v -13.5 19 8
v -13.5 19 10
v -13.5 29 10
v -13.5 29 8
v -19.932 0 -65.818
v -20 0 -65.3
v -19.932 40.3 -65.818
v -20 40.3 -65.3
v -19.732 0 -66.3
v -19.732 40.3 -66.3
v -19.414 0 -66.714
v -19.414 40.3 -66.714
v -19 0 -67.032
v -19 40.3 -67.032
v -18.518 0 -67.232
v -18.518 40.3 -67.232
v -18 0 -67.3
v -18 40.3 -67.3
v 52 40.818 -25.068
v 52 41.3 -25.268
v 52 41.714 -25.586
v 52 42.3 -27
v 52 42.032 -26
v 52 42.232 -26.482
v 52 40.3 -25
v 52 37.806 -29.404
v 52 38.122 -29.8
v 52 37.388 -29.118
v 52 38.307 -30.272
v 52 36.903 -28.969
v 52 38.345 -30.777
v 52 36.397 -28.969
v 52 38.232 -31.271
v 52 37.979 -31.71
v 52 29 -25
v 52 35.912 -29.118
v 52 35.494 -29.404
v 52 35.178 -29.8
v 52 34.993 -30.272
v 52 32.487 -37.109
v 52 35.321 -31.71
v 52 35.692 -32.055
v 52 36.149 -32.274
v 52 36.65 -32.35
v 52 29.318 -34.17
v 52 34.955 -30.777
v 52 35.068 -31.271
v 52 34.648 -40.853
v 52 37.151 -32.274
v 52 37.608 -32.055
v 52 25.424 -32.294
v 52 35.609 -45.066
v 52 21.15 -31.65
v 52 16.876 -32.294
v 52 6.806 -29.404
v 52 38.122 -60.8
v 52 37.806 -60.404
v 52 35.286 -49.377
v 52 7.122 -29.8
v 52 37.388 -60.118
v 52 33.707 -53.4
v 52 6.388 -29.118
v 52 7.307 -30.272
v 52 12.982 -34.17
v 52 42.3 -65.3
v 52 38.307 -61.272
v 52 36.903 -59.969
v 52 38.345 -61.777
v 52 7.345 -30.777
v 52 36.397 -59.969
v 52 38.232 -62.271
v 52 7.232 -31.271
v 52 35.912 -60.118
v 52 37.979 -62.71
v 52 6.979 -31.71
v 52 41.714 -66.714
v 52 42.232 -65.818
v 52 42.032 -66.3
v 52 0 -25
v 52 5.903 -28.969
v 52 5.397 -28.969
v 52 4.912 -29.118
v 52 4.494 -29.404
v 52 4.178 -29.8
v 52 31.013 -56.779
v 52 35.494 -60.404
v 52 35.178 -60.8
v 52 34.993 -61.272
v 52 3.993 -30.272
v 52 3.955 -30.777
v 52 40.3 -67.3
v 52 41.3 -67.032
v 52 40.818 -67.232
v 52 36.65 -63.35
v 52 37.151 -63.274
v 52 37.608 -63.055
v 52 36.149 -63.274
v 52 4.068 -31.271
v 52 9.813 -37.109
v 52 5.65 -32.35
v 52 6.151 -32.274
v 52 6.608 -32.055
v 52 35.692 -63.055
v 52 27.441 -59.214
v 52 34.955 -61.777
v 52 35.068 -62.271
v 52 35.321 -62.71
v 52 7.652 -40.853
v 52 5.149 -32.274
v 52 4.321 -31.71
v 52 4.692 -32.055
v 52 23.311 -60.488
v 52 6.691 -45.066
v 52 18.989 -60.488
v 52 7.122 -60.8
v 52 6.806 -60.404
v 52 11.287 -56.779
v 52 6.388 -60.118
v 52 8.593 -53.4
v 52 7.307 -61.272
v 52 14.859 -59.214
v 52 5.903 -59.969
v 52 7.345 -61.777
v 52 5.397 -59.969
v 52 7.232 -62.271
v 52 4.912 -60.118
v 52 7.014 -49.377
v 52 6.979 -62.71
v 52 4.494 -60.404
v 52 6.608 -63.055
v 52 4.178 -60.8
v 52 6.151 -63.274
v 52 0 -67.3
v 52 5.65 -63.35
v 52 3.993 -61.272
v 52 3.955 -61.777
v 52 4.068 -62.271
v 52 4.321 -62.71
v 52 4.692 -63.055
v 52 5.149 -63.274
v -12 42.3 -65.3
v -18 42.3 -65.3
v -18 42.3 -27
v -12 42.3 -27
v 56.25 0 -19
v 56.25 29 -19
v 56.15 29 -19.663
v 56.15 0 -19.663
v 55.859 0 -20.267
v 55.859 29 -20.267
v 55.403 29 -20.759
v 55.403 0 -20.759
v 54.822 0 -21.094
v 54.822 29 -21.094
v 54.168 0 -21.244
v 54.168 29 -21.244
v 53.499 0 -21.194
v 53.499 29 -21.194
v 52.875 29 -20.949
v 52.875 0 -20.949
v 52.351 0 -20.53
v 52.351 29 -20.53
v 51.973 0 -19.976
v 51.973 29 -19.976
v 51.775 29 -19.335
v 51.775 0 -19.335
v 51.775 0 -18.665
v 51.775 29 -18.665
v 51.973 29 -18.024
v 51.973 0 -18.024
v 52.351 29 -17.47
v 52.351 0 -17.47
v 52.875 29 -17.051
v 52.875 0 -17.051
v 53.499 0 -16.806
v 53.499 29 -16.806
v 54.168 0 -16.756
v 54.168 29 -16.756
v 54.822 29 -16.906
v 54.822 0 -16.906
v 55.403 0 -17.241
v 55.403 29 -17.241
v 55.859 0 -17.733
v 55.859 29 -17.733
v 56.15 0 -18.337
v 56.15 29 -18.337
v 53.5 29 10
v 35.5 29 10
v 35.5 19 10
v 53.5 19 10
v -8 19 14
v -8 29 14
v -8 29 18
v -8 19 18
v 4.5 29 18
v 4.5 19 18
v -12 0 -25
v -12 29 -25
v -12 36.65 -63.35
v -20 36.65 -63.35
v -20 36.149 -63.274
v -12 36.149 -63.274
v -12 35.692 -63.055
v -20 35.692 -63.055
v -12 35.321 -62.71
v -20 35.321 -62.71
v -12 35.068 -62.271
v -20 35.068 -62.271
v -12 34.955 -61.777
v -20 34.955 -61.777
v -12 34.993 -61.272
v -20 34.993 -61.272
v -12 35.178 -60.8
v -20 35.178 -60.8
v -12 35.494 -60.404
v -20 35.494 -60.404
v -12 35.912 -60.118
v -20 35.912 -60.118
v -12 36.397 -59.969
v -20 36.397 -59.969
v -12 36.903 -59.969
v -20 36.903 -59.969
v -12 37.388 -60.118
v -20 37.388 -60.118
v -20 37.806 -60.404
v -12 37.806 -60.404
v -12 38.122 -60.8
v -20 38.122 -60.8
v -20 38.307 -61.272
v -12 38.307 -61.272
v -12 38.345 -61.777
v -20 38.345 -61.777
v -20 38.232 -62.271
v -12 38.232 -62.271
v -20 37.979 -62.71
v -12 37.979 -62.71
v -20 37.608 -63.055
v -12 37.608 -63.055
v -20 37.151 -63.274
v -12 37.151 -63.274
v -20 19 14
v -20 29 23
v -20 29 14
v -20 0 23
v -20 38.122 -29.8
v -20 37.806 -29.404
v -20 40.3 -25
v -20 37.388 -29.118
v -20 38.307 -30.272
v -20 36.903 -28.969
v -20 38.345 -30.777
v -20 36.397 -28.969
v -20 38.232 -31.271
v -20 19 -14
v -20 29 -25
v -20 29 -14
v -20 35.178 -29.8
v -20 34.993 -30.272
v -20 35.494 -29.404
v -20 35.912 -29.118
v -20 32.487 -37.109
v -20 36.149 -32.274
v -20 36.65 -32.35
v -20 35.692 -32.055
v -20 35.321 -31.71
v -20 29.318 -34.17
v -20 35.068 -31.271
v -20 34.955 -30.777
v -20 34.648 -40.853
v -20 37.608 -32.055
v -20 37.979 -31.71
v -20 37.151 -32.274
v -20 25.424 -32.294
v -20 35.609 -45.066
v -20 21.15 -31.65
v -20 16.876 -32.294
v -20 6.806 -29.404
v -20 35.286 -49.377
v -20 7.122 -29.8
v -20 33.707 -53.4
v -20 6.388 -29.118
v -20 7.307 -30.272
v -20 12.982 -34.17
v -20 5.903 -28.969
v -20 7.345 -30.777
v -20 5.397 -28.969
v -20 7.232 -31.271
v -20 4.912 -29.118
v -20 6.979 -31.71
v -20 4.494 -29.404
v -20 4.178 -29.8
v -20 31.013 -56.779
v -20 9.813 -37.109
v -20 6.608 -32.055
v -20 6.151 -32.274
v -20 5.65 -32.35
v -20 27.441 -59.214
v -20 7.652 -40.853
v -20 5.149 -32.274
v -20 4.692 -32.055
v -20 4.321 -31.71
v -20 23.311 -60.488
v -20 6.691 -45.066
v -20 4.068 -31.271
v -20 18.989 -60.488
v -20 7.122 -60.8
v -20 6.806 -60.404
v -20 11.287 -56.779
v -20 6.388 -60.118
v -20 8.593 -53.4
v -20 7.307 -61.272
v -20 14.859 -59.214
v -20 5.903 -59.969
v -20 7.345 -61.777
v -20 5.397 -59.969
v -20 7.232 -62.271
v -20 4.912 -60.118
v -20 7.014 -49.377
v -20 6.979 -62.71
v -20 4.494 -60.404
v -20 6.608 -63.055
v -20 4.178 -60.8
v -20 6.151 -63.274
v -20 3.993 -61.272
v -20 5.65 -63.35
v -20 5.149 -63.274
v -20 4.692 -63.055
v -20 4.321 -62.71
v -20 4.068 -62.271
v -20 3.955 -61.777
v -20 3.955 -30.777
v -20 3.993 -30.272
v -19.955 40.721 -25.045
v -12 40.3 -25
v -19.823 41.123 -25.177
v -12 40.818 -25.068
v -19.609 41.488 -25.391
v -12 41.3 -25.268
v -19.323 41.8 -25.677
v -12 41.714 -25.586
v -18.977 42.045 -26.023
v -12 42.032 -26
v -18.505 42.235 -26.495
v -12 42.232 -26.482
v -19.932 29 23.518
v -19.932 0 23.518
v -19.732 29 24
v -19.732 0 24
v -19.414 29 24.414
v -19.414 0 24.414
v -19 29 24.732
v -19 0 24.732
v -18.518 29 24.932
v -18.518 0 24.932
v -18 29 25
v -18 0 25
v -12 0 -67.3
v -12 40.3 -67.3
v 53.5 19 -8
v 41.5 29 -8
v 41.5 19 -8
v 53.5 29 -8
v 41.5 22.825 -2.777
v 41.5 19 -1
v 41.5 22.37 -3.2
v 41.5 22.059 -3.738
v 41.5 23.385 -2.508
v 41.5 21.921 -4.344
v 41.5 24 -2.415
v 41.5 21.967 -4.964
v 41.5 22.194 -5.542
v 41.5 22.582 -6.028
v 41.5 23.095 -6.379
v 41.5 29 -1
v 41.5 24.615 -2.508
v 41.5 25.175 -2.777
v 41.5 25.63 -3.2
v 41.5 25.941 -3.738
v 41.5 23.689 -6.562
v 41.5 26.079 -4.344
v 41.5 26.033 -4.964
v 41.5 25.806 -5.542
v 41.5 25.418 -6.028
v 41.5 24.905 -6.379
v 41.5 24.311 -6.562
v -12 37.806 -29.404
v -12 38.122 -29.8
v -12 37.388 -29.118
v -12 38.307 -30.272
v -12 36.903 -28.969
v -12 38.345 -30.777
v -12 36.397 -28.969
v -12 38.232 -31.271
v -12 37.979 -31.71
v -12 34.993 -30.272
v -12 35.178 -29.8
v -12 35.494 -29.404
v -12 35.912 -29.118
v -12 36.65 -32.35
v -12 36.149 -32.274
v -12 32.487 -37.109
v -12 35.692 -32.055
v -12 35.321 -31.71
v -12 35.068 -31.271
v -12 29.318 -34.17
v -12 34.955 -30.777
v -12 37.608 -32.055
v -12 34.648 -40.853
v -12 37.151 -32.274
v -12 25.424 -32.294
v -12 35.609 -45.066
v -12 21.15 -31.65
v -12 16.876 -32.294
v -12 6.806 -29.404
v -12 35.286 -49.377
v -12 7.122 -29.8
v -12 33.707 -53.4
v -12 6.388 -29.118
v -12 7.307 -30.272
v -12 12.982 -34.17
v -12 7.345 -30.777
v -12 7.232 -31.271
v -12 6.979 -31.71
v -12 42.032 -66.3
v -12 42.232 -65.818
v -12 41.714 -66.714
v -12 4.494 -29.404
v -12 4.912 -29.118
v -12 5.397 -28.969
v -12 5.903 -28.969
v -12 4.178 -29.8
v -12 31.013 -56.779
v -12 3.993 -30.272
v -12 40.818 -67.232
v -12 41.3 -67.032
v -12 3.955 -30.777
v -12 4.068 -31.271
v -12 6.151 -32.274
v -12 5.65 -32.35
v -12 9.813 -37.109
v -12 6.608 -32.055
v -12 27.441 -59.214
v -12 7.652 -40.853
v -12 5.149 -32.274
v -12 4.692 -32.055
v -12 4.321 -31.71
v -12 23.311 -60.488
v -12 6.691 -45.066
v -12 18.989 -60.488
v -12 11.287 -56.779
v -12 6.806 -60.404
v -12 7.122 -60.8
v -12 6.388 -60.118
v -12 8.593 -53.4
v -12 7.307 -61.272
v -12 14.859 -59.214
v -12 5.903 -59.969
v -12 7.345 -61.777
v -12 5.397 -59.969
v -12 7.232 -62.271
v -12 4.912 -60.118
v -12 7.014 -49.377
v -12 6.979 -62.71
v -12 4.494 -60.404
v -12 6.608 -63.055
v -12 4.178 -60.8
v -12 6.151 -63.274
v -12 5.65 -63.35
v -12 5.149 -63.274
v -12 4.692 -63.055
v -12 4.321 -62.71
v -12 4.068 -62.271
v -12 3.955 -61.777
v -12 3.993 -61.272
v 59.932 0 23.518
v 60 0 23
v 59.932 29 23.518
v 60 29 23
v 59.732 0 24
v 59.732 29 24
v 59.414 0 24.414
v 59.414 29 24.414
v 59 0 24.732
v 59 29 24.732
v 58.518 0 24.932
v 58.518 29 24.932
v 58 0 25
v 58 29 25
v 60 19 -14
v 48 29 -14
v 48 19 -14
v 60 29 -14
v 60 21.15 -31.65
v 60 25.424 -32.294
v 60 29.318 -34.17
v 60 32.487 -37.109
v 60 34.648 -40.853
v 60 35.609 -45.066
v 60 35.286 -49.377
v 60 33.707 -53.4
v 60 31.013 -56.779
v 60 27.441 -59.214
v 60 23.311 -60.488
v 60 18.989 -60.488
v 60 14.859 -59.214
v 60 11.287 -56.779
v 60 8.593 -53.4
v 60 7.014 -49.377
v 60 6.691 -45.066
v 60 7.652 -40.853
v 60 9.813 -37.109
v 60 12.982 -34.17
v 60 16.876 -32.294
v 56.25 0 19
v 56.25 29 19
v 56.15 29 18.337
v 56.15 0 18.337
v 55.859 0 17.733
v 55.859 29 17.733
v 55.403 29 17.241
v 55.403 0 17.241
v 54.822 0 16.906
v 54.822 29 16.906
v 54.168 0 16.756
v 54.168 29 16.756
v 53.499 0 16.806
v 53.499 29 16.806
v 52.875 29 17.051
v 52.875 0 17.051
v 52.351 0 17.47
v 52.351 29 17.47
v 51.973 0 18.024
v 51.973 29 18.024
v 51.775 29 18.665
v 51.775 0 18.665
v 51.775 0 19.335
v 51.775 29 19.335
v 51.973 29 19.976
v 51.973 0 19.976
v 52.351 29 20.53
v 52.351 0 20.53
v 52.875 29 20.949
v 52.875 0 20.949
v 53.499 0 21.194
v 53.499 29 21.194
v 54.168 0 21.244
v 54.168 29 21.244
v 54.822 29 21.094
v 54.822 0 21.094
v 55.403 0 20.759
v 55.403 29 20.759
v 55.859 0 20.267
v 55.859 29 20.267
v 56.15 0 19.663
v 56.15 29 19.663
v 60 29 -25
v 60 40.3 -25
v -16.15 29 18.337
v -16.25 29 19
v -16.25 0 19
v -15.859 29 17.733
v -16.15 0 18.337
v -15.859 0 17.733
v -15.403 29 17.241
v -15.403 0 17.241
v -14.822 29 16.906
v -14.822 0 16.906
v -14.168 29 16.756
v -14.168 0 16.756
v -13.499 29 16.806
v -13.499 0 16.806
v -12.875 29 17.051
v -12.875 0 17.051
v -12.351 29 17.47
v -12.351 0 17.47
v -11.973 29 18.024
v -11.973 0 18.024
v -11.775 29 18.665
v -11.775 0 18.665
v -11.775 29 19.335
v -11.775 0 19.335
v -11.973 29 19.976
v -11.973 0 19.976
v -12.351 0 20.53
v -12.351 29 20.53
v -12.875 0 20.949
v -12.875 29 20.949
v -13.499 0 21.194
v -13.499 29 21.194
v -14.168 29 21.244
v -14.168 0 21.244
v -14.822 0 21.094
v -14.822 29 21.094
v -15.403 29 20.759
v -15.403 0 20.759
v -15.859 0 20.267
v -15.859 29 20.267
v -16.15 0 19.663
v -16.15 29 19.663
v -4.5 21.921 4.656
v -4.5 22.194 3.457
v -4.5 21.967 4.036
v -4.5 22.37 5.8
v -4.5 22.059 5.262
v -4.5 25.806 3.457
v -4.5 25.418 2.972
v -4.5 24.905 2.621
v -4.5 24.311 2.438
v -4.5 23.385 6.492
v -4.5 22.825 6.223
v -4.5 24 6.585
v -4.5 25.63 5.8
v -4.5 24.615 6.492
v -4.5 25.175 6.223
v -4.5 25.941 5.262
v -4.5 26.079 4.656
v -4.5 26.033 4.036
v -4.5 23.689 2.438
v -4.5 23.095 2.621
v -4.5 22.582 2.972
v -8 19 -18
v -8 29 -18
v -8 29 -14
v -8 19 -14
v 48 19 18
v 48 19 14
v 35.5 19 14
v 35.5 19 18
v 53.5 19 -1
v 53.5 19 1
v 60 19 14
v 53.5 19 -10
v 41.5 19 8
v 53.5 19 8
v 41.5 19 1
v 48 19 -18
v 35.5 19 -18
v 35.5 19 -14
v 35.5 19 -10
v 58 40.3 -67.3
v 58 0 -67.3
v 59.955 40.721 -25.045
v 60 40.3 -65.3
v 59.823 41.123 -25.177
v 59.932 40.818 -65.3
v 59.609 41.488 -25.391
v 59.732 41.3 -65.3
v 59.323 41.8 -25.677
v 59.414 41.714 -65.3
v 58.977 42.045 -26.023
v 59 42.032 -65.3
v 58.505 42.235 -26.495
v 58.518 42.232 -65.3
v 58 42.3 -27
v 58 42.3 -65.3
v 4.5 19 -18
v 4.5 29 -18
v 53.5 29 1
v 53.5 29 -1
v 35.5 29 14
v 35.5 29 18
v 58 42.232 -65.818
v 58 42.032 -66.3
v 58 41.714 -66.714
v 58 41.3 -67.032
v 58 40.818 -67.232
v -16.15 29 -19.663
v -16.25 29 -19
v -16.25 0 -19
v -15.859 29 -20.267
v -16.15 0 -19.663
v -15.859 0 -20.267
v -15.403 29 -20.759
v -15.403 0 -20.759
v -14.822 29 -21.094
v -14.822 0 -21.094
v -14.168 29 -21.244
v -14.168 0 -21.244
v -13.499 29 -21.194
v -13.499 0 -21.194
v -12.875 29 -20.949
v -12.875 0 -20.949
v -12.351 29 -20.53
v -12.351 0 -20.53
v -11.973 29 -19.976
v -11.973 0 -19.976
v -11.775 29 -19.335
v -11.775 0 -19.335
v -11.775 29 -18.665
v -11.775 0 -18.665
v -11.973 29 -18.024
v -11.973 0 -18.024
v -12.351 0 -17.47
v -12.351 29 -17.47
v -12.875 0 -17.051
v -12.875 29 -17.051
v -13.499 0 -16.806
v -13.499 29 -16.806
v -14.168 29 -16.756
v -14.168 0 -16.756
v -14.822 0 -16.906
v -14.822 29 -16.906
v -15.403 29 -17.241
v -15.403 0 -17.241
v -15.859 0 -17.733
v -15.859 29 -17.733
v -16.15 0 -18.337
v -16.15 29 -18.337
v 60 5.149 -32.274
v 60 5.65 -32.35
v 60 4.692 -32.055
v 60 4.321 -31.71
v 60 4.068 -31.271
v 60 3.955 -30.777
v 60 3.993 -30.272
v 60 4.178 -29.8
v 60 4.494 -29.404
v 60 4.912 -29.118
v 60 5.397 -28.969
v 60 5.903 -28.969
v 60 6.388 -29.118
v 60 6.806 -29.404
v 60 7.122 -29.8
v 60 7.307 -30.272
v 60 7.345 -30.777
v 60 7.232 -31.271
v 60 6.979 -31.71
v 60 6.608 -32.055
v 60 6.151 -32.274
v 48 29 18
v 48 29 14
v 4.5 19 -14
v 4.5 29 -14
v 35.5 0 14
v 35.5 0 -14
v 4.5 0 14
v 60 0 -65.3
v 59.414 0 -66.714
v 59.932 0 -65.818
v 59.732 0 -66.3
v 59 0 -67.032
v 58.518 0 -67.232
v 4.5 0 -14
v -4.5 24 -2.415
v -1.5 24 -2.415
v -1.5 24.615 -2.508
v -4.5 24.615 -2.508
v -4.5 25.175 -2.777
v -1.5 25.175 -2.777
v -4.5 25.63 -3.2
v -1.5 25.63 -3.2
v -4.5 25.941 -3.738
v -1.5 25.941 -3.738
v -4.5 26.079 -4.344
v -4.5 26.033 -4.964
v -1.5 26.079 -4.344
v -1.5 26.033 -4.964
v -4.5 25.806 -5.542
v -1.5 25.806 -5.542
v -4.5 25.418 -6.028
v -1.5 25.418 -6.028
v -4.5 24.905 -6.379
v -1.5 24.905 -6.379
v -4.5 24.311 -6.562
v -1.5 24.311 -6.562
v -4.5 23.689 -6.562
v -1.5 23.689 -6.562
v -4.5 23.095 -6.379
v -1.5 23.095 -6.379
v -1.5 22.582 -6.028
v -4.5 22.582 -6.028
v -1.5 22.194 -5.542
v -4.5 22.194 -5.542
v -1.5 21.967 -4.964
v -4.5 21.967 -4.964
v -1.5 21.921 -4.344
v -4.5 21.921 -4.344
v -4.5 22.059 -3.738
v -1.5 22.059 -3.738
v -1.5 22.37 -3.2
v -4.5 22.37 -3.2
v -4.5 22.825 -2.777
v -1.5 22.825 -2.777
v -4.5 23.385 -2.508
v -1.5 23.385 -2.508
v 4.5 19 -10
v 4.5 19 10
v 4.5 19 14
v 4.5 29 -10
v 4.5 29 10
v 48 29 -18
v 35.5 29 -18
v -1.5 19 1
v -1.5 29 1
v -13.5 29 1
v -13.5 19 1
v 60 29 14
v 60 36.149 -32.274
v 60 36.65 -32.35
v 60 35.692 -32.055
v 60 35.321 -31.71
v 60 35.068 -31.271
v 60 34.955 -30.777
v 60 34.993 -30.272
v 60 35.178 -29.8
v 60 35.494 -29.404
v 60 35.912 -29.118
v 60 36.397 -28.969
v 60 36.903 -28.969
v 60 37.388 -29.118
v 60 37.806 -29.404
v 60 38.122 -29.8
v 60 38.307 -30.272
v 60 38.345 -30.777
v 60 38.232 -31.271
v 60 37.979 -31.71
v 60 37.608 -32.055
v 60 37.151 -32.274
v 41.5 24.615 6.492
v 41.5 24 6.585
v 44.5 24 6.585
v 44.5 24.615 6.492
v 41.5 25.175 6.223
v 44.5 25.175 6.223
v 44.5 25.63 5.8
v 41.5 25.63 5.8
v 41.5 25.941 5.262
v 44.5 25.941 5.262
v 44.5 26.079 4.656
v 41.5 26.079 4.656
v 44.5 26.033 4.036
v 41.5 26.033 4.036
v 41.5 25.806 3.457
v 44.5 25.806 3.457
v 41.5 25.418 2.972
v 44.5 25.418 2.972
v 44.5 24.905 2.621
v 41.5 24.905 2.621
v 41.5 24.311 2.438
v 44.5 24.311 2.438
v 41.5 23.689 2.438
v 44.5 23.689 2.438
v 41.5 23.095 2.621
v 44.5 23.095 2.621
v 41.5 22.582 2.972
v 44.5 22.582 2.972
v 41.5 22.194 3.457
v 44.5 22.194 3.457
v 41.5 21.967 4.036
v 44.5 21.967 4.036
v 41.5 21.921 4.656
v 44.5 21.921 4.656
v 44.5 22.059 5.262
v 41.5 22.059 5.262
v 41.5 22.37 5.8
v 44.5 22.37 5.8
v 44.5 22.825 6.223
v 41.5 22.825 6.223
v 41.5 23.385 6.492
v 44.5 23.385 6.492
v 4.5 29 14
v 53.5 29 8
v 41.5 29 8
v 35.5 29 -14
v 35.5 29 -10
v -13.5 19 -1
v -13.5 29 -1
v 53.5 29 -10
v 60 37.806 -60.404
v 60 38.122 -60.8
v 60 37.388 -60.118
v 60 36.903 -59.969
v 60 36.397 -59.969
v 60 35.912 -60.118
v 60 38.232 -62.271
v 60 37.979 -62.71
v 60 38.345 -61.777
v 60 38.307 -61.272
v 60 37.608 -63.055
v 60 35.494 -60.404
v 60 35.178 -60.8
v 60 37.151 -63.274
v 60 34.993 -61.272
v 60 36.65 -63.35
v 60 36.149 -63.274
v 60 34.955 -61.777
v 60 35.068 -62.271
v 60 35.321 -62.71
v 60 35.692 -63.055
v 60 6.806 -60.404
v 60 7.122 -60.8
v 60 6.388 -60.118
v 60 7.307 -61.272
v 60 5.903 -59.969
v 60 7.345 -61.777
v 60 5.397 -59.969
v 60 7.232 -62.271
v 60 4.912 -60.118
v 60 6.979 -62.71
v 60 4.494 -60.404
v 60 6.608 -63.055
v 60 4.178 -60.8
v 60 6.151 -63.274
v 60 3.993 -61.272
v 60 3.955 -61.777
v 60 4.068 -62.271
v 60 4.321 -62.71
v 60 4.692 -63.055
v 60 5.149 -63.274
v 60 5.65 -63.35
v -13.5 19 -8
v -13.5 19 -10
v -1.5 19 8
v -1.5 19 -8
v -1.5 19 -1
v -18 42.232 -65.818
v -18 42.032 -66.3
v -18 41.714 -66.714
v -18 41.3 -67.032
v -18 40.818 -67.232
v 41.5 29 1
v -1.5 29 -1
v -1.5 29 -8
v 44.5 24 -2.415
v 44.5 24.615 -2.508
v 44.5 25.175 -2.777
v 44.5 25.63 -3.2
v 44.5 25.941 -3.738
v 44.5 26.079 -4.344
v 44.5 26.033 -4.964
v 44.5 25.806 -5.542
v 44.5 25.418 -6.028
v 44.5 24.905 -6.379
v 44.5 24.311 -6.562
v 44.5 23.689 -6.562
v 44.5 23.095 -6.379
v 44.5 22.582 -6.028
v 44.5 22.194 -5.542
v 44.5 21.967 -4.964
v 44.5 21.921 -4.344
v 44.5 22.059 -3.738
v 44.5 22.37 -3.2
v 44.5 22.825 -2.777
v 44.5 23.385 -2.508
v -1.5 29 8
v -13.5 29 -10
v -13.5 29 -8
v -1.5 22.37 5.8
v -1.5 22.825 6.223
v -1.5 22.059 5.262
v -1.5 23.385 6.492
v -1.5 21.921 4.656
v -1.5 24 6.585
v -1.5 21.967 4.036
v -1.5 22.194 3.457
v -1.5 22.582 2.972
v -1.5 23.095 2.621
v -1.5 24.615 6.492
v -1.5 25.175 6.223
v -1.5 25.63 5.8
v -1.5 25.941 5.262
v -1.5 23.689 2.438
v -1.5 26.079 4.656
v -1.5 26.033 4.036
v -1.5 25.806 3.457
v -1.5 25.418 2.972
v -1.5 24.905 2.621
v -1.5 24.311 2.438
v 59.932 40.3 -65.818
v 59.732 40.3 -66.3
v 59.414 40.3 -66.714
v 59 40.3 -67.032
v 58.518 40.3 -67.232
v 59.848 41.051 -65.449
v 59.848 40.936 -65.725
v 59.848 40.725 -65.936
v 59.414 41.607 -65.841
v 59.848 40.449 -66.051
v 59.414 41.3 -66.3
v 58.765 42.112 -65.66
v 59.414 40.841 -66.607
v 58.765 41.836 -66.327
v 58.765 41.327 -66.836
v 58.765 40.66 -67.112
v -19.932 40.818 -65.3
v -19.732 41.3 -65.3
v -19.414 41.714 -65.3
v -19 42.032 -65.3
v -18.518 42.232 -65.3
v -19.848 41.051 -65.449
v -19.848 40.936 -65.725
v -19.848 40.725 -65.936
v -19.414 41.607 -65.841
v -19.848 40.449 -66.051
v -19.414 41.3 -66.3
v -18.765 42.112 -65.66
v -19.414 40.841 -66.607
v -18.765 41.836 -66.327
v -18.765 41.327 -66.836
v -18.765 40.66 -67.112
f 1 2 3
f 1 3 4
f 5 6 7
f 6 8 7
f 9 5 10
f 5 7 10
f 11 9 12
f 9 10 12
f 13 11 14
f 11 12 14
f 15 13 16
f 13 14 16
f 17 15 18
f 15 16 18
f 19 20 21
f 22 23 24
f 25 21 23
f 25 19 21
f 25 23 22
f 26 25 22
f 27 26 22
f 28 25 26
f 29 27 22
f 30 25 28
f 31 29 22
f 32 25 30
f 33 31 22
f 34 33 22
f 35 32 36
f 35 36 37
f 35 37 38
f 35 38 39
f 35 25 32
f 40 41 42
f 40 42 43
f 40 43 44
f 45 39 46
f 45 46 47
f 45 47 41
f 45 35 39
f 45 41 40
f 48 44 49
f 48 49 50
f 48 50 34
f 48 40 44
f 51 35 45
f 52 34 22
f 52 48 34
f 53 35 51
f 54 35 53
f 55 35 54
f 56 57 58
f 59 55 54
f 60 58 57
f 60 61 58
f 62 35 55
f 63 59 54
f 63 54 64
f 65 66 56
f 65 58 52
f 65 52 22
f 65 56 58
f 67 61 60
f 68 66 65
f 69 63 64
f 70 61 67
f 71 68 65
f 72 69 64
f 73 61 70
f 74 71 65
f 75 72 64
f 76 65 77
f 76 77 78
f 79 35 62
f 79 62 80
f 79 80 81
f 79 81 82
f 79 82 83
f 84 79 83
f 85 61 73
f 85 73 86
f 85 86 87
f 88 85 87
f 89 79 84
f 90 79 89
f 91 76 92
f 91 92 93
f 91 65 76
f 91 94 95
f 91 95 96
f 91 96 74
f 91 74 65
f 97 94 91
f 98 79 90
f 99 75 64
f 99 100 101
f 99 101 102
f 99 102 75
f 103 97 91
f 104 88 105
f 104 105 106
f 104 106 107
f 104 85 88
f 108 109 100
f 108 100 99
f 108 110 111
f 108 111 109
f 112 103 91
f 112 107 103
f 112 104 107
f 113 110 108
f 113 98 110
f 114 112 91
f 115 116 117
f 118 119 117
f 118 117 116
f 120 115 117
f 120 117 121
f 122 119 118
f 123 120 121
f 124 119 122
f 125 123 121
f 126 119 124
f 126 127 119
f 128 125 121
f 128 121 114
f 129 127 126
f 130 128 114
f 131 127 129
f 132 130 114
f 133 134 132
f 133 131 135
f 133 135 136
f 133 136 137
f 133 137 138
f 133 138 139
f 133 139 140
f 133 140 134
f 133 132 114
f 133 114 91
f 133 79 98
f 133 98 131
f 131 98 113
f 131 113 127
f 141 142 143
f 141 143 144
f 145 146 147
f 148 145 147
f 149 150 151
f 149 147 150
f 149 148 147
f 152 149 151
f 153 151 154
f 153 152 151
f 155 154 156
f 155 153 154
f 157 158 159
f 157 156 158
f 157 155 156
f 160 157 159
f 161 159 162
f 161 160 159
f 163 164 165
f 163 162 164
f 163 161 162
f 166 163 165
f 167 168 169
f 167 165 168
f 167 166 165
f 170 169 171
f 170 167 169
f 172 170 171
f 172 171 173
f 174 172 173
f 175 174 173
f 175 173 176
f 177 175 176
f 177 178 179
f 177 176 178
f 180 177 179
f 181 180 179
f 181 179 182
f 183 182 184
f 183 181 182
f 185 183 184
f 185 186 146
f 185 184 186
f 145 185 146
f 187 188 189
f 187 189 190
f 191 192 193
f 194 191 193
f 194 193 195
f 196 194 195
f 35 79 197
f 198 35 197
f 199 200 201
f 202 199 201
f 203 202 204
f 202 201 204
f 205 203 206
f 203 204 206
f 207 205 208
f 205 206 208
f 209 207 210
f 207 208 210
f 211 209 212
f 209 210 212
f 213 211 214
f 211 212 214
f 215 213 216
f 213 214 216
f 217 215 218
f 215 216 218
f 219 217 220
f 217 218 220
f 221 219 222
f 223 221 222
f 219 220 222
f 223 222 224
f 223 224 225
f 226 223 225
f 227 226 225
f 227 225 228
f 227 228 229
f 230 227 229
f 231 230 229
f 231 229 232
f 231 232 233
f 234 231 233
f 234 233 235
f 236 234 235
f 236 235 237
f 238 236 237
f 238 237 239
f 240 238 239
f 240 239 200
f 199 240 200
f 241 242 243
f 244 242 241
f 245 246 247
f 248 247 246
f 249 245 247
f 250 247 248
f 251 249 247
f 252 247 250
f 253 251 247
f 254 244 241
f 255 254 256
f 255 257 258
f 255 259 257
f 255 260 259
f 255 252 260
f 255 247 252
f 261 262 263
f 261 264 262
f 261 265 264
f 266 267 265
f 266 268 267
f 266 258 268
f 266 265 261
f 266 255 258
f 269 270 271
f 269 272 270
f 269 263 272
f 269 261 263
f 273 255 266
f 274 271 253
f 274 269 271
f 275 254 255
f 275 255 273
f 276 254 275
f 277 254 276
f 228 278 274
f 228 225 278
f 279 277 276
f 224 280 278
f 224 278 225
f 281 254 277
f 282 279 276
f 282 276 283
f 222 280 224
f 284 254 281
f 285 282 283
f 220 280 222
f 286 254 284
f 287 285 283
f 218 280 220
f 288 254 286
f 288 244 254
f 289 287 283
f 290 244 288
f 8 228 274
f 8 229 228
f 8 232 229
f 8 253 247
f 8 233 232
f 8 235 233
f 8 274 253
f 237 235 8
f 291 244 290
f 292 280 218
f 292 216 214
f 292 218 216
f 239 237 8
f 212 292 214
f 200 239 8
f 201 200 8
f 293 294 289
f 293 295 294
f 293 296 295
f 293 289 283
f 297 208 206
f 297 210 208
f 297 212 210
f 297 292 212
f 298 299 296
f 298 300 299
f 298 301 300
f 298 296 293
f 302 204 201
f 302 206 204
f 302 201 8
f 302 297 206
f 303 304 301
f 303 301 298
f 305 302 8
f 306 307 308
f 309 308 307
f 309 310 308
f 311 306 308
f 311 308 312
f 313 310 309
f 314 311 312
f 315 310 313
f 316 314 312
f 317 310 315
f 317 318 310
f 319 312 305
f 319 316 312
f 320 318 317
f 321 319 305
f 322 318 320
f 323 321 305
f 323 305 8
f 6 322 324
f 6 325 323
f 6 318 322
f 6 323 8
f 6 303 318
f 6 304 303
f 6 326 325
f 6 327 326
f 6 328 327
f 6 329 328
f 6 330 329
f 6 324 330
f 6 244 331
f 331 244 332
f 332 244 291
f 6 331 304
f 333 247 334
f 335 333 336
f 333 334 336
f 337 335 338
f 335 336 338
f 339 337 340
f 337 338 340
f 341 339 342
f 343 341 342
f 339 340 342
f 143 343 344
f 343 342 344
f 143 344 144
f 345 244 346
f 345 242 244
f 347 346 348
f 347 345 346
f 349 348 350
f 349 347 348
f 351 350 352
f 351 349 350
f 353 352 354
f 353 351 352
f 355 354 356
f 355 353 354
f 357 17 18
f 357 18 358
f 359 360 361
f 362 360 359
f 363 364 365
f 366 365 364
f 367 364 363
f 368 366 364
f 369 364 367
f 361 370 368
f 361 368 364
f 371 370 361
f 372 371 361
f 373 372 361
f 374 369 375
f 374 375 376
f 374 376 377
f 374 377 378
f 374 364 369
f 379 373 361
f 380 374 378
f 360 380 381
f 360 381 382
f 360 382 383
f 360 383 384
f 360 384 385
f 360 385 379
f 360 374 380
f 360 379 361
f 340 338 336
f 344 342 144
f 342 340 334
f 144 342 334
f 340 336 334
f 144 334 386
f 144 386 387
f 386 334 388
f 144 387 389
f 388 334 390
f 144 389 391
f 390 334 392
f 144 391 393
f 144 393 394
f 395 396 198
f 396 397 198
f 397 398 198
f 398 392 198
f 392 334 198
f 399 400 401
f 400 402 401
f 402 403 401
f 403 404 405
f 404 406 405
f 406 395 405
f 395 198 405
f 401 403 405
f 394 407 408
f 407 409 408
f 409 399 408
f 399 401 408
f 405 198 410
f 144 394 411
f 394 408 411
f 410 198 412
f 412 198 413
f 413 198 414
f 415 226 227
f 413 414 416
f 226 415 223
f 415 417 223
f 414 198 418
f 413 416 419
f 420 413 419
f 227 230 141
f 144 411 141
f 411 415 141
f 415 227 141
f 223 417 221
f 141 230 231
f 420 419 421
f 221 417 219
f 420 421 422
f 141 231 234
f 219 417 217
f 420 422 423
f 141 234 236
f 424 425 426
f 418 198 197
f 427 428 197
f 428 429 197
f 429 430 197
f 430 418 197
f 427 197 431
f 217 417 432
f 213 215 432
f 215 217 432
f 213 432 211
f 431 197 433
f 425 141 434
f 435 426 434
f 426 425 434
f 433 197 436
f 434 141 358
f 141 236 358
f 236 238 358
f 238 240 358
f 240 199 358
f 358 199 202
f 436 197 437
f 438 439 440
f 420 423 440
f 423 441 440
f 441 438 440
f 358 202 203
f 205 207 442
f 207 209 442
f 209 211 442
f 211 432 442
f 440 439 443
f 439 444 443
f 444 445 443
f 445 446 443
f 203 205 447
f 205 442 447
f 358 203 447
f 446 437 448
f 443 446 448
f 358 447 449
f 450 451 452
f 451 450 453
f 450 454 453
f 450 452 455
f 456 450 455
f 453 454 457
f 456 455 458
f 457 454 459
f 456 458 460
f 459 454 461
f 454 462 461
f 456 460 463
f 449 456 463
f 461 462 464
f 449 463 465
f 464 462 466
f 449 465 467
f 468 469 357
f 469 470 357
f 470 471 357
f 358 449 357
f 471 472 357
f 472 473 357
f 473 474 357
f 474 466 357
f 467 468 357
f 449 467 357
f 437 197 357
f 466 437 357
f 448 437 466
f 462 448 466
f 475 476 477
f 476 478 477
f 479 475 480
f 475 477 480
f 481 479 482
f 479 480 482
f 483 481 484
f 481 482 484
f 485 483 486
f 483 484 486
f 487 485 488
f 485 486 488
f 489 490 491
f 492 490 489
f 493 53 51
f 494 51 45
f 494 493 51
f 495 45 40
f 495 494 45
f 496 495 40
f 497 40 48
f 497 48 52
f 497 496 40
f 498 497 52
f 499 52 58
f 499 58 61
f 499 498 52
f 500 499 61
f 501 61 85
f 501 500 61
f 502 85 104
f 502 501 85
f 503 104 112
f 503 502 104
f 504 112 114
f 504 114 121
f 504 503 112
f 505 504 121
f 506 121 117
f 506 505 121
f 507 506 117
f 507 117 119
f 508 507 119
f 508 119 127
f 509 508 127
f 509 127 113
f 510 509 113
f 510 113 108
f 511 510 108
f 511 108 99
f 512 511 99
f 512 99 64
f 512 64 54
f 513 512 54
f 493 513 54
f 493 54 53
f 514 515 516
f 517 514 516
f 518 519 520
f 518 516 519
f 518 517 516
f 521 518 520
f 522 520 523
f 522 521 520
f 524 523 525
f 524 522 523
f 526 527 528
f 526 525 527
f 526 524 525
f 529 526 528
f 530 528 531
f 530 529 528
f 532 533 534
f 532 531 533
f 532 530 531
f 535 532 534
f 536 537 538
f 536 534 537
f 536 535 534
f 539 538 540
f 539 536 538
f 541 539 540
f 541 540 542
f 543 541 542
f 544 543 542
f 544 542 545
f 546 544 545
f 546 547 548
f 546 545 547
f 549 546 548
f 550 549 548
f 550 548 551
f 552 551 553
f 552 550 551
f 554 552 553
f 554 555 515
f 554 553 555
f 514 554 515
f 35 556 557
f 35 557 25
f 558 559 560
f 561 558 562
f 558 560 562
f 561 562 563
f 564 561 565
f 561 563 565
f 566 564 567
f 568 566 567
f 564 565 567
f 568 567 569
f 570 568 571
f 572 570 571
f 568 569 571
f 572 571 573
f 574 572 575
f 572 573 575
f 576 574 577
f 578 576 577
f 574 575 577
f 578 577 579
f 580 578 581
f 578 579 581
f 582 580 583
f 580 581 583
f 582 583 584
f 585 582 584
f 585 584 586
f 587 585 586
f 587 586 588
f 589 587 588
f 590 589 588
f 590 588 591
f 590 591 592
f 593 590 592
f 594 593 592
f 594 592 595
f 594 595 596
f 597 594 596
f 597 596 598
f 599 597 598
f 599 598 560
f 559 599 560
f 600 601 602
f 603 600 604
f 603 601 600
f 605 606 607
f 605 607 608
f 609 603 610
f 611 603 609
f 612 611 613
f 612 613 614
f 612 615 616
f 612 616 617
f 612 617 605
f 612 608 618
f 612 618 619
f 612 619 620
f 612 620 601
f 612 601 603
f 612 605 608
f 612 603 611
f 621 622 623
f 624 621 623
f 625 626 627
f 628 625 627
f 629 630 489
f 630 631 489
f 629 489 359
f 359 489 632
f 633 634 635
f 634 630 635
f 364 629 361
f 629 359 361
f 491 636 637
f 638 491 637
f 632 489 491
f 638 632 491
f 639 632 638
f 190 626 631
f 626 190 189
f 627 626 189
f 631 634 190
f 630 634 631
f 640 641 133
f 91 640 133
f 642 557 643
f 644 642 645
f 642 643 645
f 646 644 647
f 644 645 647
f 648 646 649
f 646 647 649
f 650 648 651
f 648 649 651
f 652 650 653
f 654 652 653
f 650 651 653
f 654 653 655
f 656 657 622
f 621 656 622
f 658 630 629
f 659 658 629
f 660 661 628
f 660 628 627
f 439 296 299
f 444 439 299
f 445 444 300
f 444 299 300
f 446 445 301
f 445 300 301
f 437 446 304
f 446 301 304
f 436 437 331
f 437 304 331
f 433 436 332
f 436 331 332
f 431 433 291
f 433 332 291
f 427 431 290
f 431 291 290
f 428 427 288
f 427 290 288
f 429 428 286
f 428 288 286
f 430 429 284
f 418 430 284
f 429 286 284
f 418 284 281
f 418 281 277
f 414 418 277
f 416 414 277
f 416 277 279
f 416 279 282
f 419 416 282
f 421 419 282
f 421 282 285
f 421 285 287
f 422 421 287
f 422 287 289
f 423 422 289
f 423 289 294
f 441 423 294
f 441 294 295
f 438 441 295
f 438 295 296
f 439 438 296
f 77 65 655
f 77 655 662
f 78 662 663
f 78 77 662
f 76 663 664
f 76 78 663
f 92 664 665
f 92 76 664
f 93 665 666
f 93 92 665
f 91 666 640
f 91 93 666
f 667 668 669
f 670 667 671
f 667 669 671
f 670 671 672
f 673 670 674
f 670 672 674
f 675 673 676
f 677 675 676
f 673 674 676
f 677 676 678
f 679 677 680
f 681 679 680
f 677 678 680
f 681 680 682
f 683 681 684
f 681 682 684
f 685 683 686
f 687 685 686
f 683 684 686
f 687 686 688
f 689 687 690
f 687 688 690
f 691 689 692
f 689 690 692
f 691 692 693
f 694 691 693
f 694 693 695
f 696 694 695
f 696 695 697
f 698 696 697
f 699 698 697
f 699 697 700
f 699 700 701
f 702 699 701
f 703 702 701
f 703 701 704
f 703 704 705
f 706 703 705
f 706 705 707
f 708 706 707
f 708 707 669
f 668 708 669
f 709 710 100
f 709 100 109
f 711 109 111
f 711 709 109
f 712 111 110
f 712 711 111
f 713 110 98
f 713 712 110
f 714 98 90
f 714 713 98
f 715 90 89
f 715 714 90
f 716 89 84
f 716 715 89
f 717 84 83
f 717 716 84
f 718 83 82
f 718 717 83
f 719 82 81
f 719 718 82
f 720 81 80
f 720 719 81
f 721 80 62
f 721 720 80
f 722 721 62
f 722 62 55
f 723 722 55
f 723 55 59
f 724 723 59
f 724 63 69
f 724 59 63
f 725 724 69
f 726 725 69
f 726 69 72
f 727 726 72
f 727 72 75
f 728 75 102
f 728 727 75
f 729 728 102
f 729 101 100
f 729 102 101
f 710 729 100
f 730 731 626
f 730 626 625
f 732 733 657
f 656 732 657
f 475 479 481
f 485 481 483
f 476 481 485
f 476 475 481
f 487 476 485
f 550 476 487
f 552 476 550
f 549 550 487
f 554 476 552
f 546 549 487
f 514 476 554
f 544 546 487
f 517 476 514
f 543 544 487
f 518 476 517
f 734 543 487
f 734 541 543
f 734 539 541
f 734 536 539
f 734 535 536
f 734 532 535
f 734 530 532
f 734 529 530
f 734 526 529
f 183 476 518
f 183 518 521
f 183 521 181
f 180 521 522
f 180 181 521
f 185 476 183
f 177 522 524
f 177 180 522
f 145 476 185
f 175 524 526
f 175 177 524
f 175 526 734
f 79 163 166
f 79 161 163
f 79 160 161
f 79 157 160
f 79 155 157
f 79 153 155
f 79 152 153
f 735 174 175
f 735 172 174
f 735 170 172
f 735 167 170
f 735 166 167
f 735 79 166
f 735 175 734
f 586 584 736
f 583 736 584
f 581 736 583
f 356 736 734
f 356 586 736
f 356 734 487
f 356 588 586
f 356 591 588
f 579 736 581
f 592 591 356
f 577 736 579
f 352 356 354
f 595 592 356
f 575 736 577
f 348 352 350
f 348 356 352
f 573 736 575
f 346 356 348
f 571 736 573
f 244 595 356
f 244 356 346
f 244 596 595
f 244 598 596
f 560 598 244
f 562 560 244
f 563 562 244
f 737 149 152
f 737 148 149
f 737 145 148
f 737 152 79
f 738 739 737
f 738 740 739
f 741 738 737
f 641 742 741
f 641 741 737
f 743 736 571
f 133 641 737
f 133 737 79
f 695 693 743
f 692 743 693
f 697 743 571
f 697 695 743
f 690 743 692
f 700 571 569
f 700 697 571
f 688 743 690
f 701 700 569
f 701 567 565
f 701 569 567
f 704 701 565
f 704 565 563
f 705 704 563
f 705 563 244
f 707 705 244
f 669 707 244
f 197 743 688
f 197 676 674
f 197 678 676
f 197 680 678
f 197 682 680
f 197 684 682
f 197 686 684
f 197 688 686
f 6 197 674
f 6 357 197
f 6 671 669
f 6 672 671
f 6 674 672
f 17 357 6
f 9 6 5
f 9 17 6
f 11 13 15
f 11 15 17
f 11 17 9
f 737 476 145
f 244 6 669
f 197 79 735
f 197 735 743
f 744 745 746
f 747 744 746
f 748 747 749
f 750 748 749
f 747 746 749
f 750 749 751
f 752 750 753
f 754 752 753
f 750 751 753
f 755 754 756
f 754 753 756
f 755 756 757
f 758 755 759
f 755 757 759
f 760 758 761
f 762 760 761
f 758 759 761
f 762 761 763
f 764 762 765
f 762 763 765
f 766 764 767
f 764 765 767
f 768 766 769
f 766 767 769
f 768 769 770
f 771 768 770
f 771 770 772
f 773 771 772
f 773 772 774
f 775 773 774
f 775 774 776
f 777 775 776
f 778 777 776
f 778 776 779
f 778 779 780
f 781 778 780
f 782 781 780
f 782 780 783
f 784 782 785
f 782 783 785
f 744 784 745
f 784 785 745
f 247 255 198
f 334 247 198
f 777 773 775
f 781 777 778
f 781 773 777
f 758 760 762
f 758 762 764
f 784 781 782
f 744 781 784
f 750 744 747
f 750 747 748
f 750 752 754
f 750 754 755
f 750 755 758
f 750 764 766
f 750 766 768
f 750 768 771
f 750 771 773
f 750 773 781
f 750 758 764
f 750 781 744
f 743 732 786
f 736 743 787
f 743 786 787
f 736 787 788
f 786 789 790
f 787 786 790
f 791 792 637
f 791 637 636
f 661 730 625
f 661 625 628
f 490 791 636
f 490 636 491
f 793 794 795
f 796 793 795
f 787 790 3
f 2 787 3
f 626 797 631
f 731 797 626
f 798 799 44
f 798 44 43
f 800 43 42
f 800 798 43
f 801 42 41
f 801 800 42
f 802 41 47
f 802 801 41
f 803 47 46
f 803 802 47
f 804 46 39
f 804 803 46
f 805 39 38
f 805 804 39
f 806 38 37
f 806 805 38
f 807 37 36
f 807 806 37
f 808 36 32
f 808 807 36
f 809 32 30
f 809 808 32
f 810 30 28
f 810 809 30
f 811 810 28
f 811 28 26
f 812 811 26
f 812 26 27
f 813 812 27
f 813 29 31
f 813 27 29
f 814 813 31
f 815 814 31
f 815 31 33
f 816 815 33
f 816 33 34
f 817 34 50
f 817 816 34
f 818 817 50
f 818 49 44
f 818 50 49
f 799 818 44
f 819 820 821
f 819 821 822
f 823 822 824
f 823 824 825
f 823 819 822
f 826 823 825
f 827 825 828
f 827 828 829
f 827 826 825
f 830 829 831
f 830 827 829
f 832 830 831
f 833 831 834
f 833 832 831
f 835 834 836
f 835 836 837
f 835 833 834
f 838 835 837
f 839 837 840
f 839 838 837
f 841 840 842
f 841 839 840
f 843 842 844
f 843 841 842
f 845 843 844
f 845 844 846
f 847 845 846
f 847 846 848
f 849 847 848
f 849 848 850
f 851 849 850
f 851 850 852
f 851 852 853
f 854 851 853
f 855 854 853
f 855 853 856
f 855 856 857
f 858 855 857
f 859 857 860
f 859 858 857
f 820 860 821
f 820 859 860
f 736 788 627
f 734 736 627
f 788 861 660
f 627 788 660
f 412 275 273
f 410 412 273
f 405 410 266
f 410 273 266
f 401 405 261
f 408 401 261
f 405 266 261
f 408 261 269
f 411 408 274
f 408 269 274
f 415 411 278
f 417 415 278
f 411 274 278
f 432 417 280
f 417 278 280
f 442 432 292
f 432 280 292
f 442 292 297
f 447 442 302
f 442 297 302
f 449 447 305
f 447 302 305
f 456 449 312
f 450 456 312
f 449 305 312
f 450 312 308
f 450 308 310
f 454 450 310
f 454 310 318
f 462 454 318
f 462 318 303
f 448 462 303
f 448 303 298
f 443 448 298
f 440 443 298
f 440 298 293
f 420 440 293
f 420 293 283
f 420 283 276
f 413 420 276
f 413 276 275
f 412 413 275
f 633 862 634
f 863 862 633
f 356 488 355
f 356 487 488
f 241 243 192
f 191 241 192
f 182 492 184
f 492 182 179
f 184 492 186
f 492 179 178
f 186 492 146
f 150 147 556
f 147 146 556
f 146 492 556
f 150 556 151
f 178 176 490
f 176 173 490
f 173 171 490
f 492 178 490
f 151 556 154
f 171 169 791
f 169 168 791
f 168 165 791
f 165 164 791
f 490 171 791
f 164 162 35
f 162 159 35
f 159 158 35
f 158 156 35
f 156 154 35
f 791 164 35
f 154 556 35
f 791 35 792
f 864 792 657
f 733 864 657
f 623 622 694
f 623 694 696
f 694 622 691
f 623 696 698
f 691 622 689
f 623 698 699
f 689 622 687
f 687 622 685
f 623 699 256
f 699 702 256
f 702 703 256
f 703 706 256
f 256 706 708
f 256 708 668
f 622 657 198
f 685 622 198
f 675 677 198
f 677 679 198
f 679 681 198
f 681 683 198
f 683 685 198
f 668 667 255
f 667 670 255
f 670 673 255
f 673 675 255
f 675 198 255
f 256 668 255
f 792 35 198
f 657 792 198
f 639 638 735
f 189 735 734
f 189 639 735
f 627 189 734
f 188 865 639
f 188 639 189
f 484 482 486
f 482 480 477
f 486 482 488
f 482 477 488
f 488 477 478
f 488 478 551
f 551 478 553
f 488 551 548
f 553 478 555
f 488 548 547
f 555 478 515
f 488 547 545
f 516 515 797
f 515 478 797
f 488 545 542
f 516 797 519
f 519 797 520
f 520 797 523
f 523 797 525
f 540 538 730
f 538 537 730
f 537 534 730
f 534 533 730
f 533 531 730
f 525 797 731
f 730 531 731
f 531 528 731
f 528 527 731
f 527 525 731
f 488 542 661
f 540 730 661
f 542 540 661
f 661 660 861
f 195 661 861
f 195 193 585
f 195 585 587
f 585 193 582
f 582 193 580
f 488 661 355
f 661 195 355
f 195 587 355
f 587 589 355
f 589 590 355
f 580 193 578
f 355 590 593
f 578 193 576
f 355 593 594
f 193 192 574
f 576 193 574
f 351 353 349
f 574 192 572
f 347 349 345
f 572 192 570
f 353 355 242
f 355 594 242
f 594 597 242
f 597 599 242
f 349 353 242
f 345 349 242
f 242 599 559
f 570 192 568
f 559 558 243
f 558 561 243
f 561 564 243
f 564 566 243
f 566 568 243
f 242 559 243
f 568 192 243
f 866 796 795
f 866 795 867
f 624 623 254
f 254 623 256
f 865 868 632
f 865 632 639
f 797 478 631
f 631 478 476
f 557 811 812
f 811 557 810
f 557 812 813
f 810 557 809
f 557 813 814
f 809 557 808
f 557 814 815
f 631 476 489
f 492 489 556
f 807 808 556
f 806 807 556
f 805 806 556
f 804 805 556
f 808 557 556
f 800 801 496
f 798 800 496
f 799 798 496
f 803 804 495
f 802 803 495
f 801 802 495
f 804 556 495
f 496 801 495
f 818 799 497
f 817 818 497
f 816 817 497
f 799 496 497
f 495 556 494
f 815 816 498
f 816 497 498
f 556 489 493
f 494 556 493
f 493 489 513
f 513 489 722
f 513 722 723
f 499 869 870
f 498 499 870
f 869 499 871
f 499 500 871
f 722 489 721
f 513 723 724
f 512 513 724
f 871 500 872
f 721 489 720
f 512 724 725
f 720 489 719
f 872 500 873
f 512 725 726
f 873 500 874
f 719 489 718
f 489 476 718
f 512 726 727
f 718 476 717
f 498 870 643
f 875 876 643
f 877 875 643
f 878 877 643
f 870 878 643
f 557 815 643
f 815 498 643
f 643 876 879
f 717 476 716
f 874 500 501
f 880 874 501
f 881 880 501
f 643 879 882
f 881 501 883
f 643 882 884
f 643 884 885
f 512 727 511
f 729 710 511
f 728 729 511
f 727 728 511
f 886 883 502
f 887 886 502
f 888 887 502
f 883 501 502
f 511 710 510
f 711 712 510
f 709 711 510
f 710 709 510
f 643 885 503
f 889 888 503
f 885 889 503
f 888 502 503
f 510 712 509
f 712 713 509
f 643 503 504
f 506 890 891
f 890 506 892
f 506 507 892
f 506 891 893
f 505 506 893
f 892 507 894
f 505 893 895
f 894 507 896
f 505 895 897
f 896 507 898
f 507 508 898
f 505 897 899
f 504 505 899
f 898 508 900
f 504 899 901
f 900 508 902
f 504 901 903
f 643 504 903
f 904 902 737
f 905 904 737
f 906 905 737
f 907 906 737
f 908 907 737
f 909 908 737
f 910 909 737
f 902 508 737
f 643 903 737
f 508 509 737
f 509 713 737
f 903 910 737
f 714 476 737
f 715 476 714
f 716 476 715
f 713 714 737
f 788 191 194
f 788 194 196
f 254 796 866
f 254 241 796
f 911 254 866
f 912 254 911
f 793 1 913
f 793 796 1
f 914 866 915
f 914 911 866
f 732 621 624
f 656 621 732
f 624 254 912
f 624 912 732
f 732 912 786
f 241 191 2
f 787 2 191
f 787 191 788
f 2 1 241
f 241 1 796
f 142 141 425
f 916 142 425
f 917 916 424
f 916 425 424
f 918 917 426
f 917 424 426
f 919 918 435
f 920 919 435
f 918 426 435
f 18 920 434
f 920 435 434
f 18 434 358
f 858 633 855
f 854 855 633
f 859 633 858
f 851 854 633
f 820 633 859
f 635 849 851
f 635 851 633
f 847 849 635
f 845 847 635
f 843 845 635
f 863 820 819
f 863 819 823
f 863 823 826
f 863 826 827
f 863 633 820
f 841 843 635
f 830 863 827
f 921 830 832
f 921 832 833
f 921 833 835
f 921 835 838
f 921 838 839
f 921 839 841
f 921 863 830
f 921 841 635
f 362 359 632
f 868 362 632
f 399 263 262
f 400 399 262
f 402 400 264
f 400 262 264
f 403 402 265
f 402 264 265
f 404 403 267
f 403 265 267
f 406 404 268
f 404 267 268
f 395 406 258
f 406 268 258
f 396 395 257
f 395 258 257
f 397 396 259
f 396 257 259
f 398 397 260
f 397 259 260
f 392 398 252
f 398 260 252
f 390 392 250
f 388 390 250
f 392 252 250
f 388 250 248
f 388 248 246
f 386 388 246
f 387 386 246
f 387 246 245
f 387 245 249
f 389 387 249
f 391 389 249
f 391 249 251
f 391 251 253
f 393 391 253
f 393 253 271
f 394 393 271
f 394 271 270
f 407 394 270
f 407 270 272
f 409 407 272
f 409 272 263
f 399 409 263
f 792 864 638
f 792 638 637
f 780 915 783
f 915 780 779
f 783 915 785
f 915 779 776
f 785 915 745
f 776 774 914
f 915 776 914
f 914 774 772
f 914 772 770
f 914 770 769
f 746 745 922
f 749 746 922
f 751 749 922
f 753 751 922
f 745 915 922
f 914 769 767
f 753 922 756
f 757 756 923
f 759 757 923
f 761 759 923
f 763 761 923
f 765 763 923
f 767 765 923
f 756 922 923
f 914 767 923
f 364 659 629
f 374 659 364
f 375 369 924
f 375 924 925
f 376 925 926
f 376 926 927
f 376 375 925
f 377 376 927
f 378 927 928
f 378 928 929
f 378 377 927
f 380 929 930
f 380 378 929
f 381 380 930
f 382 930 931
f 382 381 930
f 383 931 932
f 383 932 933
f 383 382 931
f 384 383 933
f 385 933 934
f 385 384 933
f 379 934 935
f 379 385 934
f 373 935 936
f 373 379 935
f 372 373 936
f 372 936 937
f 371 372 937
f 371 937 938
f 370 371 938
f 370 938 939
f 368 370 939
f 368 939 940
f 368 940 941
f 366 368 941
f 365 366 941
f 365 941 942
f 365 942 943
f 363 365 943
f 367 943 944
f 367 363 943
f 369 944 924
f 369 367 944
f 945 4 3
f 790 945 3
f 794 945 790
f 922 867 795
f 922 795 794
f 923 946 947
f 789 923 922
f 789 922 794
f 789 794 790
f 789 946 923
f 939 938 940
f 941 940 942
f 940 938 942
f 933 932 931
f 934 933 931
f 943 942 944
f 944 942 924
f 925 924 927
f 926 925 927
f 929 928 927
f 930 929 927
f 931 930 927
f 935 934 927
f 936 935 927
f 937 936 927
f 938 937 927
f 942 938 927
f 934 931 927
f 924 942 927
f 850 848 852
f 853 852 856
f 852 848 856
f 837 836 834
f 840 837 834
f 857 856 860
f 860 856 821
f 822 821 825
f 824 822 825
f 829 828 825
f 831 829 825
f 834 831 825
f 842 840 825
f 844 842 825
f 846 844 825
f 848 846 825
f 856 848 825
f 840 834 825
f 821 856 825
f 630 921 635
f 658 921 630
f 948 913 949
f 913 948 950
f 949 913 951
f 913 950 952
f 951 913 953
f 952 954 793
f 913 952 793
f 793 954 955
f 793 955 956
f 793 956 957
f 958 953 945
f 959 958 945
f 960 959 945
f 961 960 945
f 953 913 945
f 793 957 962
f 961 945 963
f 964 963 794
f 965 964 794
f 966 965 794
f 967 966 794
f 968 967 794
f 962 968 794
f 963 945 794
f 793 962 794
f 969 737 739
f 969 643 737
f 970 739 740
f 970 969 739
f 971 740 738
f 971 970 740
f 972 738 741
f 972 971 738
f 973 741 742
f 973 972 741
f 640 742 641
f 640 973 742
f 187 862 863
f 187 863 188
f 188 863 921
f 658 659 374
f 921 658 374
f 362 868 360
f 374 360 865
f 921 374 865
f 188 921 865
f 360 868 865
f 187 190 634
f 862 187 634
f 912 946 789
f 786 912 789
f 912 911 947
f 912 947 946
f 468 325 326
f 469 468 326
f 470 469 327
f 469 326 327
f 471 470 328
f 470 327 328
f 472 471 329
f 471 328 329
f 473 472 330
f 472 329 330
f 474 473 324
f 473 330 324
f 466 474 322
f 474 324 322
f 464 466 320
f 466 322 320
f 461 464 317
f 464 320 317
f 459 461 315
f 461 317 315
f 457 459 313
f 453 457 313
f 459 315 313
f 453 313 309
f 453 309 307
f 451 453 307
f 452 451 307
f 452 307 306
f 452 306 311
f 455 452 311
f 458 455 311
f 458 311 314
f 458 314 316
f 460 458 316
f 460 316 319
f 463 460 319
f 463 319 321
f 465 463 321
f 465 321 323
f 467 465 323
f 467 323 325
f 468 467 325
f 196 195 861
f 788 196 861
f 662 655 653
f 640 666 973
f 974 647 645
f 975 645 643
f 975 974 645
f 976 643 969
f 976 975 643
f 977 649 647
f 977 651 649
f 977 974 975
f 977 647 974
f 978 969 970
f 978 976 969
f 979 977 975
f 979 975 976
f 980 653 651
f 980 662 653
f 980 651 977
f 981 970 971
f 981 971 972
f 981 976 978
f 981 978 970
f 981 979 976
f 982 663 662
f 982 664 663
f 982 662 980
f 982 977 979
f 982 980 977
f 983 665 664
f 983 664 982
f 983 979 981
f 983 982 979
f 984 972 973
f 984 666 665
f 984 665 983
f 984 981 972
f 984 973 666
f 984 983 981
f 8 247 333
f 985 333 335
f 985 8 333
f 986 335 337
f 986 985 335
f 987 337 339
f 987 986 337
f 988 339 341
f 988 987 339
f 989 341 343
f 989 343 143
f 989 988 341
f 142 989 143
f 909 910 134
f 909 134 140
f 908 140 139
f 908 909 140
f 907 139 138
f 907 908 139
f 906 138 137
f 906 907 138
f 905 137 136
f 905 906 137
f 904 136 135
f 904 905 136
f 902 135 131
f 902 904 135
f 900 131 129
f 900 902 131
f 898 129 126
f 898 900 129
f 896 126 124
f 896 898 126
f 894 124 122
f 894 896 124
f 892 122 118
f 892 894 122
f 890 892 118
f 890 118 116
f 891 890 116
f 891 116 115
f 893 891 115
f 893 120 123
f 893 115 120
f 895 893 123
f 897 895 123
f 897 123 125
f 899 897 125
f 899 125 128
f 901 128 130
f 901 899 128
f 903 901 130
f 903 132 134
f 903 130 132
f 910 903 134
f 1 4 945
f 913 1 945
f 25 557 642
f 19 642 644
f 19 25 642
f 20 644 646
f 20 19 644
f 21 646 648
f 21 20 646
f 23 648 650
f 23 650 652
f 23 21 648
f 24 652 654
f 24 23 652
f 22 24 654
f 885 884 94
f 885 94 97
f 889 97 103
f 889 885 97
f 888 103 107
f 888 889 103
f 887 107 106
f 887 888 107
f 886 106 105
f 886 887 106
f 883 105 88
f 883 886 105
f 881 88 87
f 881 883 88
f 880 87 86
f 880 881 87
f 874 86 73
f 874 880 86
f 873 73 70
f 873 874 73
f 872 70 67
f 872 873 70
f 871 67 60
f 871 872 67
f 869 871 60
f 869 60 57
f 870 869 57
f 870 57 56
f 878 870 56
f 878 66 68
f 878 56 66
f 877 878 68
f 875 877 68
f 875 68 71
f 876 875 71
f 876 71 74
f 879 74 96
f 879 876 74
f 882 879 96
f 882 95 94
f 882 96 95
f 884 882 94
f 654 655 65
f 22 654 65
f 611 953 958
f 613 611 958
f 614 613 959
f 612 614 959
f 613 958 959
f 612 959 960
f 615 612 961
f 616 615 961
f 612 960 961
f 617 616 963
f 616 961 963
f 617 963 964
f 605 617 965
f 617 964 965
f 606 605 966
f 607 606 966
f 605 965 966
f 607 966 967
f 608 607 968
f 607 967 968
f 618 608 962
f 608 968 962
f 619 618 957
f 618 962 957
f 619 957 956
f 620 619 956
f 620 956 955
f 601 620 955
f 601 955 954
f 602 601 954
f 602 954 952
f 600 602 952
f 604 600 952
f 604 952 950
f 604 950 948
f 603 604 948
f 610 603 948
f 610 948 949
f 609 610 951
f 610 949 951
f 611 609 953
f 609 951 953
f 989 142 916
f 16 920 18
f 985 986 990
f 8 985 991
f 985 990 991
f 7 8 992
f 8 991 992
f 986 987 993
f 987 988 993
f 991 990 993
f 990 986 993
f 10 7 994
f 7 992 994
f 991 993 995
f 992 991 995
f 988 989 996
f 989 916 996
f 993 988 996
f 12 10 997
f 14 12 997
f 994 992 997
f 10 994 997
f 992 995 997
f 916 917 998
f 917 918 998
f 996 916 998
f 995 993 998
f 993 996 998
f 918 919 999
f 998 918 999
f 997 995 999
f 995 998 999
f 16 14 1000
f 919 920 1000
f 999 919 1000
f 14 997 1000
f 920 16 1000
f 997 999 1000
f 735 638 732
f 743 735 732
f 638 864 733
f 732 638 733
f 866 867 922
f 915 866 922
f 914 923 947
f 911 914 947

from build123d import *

# Parameters (mm, degrees)
SKETCH2_W            = 40
SKETCH2_H            = 50
BOSS_EXTRUDE1_DEPTH  = 29
CUT_EXTRUDE2_DEPTH   = 10
SKETCH6_R            = 2.085
BOSS_EXTRUDE2_DEPTH  = 3
CUT_EXTRUDE3_DEPTH   = 44.197222133
M4_CLEARANCE_HOLE2_D = 4.5
SKETCH2_3_W          = 8
SKETCH2_3_H          = 42.3
BOSS_EXTRUDE3_DEPTH  = 42.3
CUT_EXTRUDE4_REACH   = 90.986
SKETCH15_R           = 14.5
M3_CLEARANCE_HOLE1_D = 3.4
FILLET1_R            = 2
FILLET1_OF_MIRROR1_R = 2


with BuildPart() as part:
    # Sketch2 → Boss-Extrude1 (new body)
    with BuildSketch(Plane(origin=(0, 0, 0), x_dir=(1, 0, 0), z_dir=(0, 1, 0))):
        Rectangle(SKETCH2_W, SKETCH2_H)
    boss_extrude1 = extrude(amount=BOSS_EXTRUDE1_DEPTH)

    # Sketch3 → Cut-Extrude2 (cut)
    with BuildSketch(Plane(origin=(0, 29, 0), x_dir=(1, 0, 0), z_dir=(0, 1, 0))):
        Polygon((-8, 14), (-20, 14), (-20, -14), (-8, -14), (-8, -18), (4.5, -18), (4.5, -14), (4.5, -10), (-13.5, -10), (-13.5, -8), (-1.5, -8), (-1.5, -1), (-13.5, -1), (-13.5, 1), (-1.5, 1), (-1.5, 8), (-13.5, 8), (-13.5, 10), (4.5, 10), (4.5, 14), (4.5, 18), (-8, 18), align=None)
    cut_extrude2 = extrude(amount=-CUT_EXTRUDE2_DEPTH, mode=Mode.SUBTRACT)

    # Sketch6 → Boss-Extrude2 (add)
    with BuildSketch(Plane.ZY.offset(1.5)):
        with Locations((-4.5, 24)):
            Circle(SKETCH6_R)
        with Locations((4.5, 24)):
            Circle(SKETCH6_R)
    boss_extrude2 = extrude(amount=BOSS_EXTRUDE2_DEPTH)

    # Sketch3<4> → Cut-Extrude3 (cut, through all)
    with BuildSketch(Plane(origin=(0, 29, 0), x_dir=(1, 0, 0), z_dir=(0, 1, 0))):
        Polygon((20, -14), (20, 14), (4.5, 14), (4.5, 10), (4.5, -10), (4.5, -14), align=None)
    cut_extrude3 = extrude(amount=-CUT_EXTRUDE3_DEPTH, mode=Mode.SUBTRACT)

    # M4 Clearance Hole2 (through all)
    with Locations(Plane(origin=(0, 29, 0), x_dir=(1, 0, 0), z_dir=(0, 1, 0))):
        with Locations((-14, -19), (-14, 19)):
            m4_clearance_hole2 = Hole(M4_CLEARANCE_HOLE2_D / 2)

    # Sketch2<3> → Boss-Extrude3 (add)
    with BuildSketch(Plane(origin=(0, 0, 0), x_dir=(1, 0, 0), z_dir=(0, 1, 0))):
        with Locations((-16, 46.15)):
            Rectangle(SKETCH2_3_W, SKETCH2_3_H)
    boss_extrude3 = extrude(amount=BOSS_EXTRUDE3_DEPTH)

    # Sketch15 → Cut-Extrude4 (cut, up to next)
    with BuildSketch(Plane.ZY.offset(20), mode=Mode.PRIVATE) as cut_extrude4_sk1:
        with Locations((-46.15, 21.15)):
            Circle(SKETCH15_R)
    cut_extrude4_tool1 = extrude(cut_extrude4_sk1.sketch, amount=-CUT_EXTRUDE4_REACH, mode=Mode.PRIVATE) & part.part
    cut_extrude4 = cut_extrude4_tool1.solids().sort_by_distance((-20, 21.15, -46.15))[0]
    add(cut_extrude4, mode=Mode.SUBTRACT)

    # M3 Clearance Hole1 (through all)
    with Locations(Plane(origin=(-12, 0, 0), x_dir=(0, 0, 1), z_dir=(1, 0, 0))):
        with Locations((-61.65, -36.65), (-30.65, -36.65), (-61.65, -5.65), (-30.65, -5.65)):
            m3_clearance_hole1 = Hole(M3_CLEARANCE_HOLE1_D / 2)

    # Fillet1
    fillet1_edges = [part.edges().sort_by_distance(p)[0] for p in [
        (-16, 42.3, -67.3),
        (-20, 42.3, -46.15),
        (-20, 21.15, -67.3),
        (-16, 42.3, -25),
        (-20, 14.5, 25),
    ]]
    fillet(fillet1_edges, radius=FILLET1_R)

    # Mirror1: Boss-Extrude1, Cut-Extrude2, Boss-Extrude2, Cut-Extrude3, M4 Clearance Hole2, Boss-Extrude3, Cut-Extrude4, M3 Clearance Hole1 across plane
    add(boss_extrude1.mirror(Plane(origin=(20, 0, 0), x_dir=(0, 0, 1), z_dir=(1, 0, 0))))
    add(cut_extrude2.mirror(Plane(origin=(20, 0, 0), x_dir=(0, 0, 1), z_dir=(1, 0, 0))), mode=Mode.SUBTRACT)
    add(boss_extrude2.mirror(Plane(origin=(20, 0, 0), x_dir=(0, 0, 1), z_dir=(1, 0, 0))))
    add(cut_extrude3.mirror(Plane(origin=(20, 0, 0), x_dir=(0, 0, 1), z_dir=(1, 0, 0))), mode=Mode.SUBTRACT)
    add(m4_clearance_hole2.mirror(Plane(origin=(20, 0, 0), x_dir=(0, 0, 1), z_dir=(1, 0, 0))), mode=Mode.SUBTRACT)
    add(boss_extrude3.mirror(Plane(origin=(20, 0, 0), x_dir=(0, 0, 1), z_dir=(1, 0, 0))))
    add(cut_extrude4.mirror(Plane(origin=(20, 0, 0), x_dir=(0, 0, 1), z_dir=(1, 0, 0))), mode=Mode.SUBTRACT)
    add(m3_clearance_hole1.mirror(Plane(origin=(20, 0, 0), x_dir=(0, 0, 1), z_dir=(1, 0, 0))), mode=Mode.SUBTRACT)

    # Fillet1 of Mirror1
    fillet1_of_mirror1_edges = [part.edges().sort_by_distance(p)[0] for p in [
        (56, 42.3, -67.3),
        (60, 42.3, -46.15),
        (60, 21.15, -67.3),
        (56, 42.3, -25),
        (60, 14.5, 25),
    ]]
    fillet(fillet1_of_mirror1_edges, radius=FILLET1_OF_MIRROR1_R)


solid = part.part
